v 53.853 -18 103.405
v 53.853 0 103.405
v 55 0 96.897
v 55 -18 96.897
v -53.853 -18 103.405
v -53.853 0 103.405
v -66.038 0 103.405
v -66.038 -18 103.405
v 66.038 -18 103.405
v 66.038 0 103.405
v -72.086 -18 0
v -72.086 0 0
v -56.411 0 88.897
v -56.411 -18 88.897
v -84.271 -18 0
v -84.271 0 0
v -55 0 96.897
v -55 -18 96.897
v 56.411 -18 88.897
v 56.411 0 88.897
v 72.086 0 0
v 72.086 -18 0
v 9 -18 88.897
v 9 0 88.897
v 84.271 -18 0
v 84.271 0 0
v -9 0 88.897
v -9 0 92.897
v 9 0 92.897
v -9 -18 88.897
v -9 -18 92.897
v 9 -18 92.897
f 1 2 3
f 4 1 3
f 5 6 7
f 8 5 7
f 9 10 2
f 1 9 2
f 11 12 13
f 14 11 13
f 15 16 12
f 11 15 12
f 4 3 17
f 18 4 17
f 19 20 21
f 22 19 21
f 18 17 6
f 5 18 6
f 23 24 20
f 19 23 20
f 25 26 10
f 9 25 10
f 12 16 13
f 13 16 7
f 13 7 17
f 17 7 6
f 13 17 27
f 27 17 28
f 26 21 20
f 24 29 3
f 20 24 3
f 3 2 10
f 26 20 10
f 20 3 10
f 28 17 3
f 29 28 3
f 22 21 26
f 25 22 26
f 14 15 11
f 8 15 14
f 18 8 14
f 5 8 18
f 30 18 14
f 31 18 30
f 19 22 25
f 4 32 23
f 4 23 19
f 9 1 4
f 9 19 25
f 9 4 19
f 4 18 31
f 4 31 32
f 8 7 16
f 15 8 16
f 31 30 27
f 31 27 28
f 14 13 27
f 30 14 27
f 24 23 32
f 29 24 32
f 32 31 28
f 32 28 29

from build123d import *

# Parameters (mm, degrees)
F1_DEPTH = 18
F2_W     = 18
F2_H     = 4
F3_DEPTH = 20


with BuildPart() as f1:
    # F0 (on Front) → F1 (new body)
    with BuildSketch(Plane.XZ):
        Polygon((55, 96.89723), (0, 96.89723), (-55, 96.89723), (-53.852537, 103.404814), (-66.037657, 103.404814), (-84.270715, 0), (-72.085596, 0), (-56.410616, 88.89723), (0, 88.89723), (56.410616, 88.89723), (72.085596, 0), (84.270715, 0), (66.037657, 103.404814), (53.852537, 103.404814), align=None)
    extrude(amount=F1_DEPTH)

    # F2 (on face) → F3 (cut)
    with BuildSketch(Plane.XZ.offset(18)):
        with Locations((0, 90.89723)):
            Rectangle(F2_W, F2_H)
    extrude(amount=-F3_DEPTH, mode=Mode.SUBTRACT)


solid = f1.part
